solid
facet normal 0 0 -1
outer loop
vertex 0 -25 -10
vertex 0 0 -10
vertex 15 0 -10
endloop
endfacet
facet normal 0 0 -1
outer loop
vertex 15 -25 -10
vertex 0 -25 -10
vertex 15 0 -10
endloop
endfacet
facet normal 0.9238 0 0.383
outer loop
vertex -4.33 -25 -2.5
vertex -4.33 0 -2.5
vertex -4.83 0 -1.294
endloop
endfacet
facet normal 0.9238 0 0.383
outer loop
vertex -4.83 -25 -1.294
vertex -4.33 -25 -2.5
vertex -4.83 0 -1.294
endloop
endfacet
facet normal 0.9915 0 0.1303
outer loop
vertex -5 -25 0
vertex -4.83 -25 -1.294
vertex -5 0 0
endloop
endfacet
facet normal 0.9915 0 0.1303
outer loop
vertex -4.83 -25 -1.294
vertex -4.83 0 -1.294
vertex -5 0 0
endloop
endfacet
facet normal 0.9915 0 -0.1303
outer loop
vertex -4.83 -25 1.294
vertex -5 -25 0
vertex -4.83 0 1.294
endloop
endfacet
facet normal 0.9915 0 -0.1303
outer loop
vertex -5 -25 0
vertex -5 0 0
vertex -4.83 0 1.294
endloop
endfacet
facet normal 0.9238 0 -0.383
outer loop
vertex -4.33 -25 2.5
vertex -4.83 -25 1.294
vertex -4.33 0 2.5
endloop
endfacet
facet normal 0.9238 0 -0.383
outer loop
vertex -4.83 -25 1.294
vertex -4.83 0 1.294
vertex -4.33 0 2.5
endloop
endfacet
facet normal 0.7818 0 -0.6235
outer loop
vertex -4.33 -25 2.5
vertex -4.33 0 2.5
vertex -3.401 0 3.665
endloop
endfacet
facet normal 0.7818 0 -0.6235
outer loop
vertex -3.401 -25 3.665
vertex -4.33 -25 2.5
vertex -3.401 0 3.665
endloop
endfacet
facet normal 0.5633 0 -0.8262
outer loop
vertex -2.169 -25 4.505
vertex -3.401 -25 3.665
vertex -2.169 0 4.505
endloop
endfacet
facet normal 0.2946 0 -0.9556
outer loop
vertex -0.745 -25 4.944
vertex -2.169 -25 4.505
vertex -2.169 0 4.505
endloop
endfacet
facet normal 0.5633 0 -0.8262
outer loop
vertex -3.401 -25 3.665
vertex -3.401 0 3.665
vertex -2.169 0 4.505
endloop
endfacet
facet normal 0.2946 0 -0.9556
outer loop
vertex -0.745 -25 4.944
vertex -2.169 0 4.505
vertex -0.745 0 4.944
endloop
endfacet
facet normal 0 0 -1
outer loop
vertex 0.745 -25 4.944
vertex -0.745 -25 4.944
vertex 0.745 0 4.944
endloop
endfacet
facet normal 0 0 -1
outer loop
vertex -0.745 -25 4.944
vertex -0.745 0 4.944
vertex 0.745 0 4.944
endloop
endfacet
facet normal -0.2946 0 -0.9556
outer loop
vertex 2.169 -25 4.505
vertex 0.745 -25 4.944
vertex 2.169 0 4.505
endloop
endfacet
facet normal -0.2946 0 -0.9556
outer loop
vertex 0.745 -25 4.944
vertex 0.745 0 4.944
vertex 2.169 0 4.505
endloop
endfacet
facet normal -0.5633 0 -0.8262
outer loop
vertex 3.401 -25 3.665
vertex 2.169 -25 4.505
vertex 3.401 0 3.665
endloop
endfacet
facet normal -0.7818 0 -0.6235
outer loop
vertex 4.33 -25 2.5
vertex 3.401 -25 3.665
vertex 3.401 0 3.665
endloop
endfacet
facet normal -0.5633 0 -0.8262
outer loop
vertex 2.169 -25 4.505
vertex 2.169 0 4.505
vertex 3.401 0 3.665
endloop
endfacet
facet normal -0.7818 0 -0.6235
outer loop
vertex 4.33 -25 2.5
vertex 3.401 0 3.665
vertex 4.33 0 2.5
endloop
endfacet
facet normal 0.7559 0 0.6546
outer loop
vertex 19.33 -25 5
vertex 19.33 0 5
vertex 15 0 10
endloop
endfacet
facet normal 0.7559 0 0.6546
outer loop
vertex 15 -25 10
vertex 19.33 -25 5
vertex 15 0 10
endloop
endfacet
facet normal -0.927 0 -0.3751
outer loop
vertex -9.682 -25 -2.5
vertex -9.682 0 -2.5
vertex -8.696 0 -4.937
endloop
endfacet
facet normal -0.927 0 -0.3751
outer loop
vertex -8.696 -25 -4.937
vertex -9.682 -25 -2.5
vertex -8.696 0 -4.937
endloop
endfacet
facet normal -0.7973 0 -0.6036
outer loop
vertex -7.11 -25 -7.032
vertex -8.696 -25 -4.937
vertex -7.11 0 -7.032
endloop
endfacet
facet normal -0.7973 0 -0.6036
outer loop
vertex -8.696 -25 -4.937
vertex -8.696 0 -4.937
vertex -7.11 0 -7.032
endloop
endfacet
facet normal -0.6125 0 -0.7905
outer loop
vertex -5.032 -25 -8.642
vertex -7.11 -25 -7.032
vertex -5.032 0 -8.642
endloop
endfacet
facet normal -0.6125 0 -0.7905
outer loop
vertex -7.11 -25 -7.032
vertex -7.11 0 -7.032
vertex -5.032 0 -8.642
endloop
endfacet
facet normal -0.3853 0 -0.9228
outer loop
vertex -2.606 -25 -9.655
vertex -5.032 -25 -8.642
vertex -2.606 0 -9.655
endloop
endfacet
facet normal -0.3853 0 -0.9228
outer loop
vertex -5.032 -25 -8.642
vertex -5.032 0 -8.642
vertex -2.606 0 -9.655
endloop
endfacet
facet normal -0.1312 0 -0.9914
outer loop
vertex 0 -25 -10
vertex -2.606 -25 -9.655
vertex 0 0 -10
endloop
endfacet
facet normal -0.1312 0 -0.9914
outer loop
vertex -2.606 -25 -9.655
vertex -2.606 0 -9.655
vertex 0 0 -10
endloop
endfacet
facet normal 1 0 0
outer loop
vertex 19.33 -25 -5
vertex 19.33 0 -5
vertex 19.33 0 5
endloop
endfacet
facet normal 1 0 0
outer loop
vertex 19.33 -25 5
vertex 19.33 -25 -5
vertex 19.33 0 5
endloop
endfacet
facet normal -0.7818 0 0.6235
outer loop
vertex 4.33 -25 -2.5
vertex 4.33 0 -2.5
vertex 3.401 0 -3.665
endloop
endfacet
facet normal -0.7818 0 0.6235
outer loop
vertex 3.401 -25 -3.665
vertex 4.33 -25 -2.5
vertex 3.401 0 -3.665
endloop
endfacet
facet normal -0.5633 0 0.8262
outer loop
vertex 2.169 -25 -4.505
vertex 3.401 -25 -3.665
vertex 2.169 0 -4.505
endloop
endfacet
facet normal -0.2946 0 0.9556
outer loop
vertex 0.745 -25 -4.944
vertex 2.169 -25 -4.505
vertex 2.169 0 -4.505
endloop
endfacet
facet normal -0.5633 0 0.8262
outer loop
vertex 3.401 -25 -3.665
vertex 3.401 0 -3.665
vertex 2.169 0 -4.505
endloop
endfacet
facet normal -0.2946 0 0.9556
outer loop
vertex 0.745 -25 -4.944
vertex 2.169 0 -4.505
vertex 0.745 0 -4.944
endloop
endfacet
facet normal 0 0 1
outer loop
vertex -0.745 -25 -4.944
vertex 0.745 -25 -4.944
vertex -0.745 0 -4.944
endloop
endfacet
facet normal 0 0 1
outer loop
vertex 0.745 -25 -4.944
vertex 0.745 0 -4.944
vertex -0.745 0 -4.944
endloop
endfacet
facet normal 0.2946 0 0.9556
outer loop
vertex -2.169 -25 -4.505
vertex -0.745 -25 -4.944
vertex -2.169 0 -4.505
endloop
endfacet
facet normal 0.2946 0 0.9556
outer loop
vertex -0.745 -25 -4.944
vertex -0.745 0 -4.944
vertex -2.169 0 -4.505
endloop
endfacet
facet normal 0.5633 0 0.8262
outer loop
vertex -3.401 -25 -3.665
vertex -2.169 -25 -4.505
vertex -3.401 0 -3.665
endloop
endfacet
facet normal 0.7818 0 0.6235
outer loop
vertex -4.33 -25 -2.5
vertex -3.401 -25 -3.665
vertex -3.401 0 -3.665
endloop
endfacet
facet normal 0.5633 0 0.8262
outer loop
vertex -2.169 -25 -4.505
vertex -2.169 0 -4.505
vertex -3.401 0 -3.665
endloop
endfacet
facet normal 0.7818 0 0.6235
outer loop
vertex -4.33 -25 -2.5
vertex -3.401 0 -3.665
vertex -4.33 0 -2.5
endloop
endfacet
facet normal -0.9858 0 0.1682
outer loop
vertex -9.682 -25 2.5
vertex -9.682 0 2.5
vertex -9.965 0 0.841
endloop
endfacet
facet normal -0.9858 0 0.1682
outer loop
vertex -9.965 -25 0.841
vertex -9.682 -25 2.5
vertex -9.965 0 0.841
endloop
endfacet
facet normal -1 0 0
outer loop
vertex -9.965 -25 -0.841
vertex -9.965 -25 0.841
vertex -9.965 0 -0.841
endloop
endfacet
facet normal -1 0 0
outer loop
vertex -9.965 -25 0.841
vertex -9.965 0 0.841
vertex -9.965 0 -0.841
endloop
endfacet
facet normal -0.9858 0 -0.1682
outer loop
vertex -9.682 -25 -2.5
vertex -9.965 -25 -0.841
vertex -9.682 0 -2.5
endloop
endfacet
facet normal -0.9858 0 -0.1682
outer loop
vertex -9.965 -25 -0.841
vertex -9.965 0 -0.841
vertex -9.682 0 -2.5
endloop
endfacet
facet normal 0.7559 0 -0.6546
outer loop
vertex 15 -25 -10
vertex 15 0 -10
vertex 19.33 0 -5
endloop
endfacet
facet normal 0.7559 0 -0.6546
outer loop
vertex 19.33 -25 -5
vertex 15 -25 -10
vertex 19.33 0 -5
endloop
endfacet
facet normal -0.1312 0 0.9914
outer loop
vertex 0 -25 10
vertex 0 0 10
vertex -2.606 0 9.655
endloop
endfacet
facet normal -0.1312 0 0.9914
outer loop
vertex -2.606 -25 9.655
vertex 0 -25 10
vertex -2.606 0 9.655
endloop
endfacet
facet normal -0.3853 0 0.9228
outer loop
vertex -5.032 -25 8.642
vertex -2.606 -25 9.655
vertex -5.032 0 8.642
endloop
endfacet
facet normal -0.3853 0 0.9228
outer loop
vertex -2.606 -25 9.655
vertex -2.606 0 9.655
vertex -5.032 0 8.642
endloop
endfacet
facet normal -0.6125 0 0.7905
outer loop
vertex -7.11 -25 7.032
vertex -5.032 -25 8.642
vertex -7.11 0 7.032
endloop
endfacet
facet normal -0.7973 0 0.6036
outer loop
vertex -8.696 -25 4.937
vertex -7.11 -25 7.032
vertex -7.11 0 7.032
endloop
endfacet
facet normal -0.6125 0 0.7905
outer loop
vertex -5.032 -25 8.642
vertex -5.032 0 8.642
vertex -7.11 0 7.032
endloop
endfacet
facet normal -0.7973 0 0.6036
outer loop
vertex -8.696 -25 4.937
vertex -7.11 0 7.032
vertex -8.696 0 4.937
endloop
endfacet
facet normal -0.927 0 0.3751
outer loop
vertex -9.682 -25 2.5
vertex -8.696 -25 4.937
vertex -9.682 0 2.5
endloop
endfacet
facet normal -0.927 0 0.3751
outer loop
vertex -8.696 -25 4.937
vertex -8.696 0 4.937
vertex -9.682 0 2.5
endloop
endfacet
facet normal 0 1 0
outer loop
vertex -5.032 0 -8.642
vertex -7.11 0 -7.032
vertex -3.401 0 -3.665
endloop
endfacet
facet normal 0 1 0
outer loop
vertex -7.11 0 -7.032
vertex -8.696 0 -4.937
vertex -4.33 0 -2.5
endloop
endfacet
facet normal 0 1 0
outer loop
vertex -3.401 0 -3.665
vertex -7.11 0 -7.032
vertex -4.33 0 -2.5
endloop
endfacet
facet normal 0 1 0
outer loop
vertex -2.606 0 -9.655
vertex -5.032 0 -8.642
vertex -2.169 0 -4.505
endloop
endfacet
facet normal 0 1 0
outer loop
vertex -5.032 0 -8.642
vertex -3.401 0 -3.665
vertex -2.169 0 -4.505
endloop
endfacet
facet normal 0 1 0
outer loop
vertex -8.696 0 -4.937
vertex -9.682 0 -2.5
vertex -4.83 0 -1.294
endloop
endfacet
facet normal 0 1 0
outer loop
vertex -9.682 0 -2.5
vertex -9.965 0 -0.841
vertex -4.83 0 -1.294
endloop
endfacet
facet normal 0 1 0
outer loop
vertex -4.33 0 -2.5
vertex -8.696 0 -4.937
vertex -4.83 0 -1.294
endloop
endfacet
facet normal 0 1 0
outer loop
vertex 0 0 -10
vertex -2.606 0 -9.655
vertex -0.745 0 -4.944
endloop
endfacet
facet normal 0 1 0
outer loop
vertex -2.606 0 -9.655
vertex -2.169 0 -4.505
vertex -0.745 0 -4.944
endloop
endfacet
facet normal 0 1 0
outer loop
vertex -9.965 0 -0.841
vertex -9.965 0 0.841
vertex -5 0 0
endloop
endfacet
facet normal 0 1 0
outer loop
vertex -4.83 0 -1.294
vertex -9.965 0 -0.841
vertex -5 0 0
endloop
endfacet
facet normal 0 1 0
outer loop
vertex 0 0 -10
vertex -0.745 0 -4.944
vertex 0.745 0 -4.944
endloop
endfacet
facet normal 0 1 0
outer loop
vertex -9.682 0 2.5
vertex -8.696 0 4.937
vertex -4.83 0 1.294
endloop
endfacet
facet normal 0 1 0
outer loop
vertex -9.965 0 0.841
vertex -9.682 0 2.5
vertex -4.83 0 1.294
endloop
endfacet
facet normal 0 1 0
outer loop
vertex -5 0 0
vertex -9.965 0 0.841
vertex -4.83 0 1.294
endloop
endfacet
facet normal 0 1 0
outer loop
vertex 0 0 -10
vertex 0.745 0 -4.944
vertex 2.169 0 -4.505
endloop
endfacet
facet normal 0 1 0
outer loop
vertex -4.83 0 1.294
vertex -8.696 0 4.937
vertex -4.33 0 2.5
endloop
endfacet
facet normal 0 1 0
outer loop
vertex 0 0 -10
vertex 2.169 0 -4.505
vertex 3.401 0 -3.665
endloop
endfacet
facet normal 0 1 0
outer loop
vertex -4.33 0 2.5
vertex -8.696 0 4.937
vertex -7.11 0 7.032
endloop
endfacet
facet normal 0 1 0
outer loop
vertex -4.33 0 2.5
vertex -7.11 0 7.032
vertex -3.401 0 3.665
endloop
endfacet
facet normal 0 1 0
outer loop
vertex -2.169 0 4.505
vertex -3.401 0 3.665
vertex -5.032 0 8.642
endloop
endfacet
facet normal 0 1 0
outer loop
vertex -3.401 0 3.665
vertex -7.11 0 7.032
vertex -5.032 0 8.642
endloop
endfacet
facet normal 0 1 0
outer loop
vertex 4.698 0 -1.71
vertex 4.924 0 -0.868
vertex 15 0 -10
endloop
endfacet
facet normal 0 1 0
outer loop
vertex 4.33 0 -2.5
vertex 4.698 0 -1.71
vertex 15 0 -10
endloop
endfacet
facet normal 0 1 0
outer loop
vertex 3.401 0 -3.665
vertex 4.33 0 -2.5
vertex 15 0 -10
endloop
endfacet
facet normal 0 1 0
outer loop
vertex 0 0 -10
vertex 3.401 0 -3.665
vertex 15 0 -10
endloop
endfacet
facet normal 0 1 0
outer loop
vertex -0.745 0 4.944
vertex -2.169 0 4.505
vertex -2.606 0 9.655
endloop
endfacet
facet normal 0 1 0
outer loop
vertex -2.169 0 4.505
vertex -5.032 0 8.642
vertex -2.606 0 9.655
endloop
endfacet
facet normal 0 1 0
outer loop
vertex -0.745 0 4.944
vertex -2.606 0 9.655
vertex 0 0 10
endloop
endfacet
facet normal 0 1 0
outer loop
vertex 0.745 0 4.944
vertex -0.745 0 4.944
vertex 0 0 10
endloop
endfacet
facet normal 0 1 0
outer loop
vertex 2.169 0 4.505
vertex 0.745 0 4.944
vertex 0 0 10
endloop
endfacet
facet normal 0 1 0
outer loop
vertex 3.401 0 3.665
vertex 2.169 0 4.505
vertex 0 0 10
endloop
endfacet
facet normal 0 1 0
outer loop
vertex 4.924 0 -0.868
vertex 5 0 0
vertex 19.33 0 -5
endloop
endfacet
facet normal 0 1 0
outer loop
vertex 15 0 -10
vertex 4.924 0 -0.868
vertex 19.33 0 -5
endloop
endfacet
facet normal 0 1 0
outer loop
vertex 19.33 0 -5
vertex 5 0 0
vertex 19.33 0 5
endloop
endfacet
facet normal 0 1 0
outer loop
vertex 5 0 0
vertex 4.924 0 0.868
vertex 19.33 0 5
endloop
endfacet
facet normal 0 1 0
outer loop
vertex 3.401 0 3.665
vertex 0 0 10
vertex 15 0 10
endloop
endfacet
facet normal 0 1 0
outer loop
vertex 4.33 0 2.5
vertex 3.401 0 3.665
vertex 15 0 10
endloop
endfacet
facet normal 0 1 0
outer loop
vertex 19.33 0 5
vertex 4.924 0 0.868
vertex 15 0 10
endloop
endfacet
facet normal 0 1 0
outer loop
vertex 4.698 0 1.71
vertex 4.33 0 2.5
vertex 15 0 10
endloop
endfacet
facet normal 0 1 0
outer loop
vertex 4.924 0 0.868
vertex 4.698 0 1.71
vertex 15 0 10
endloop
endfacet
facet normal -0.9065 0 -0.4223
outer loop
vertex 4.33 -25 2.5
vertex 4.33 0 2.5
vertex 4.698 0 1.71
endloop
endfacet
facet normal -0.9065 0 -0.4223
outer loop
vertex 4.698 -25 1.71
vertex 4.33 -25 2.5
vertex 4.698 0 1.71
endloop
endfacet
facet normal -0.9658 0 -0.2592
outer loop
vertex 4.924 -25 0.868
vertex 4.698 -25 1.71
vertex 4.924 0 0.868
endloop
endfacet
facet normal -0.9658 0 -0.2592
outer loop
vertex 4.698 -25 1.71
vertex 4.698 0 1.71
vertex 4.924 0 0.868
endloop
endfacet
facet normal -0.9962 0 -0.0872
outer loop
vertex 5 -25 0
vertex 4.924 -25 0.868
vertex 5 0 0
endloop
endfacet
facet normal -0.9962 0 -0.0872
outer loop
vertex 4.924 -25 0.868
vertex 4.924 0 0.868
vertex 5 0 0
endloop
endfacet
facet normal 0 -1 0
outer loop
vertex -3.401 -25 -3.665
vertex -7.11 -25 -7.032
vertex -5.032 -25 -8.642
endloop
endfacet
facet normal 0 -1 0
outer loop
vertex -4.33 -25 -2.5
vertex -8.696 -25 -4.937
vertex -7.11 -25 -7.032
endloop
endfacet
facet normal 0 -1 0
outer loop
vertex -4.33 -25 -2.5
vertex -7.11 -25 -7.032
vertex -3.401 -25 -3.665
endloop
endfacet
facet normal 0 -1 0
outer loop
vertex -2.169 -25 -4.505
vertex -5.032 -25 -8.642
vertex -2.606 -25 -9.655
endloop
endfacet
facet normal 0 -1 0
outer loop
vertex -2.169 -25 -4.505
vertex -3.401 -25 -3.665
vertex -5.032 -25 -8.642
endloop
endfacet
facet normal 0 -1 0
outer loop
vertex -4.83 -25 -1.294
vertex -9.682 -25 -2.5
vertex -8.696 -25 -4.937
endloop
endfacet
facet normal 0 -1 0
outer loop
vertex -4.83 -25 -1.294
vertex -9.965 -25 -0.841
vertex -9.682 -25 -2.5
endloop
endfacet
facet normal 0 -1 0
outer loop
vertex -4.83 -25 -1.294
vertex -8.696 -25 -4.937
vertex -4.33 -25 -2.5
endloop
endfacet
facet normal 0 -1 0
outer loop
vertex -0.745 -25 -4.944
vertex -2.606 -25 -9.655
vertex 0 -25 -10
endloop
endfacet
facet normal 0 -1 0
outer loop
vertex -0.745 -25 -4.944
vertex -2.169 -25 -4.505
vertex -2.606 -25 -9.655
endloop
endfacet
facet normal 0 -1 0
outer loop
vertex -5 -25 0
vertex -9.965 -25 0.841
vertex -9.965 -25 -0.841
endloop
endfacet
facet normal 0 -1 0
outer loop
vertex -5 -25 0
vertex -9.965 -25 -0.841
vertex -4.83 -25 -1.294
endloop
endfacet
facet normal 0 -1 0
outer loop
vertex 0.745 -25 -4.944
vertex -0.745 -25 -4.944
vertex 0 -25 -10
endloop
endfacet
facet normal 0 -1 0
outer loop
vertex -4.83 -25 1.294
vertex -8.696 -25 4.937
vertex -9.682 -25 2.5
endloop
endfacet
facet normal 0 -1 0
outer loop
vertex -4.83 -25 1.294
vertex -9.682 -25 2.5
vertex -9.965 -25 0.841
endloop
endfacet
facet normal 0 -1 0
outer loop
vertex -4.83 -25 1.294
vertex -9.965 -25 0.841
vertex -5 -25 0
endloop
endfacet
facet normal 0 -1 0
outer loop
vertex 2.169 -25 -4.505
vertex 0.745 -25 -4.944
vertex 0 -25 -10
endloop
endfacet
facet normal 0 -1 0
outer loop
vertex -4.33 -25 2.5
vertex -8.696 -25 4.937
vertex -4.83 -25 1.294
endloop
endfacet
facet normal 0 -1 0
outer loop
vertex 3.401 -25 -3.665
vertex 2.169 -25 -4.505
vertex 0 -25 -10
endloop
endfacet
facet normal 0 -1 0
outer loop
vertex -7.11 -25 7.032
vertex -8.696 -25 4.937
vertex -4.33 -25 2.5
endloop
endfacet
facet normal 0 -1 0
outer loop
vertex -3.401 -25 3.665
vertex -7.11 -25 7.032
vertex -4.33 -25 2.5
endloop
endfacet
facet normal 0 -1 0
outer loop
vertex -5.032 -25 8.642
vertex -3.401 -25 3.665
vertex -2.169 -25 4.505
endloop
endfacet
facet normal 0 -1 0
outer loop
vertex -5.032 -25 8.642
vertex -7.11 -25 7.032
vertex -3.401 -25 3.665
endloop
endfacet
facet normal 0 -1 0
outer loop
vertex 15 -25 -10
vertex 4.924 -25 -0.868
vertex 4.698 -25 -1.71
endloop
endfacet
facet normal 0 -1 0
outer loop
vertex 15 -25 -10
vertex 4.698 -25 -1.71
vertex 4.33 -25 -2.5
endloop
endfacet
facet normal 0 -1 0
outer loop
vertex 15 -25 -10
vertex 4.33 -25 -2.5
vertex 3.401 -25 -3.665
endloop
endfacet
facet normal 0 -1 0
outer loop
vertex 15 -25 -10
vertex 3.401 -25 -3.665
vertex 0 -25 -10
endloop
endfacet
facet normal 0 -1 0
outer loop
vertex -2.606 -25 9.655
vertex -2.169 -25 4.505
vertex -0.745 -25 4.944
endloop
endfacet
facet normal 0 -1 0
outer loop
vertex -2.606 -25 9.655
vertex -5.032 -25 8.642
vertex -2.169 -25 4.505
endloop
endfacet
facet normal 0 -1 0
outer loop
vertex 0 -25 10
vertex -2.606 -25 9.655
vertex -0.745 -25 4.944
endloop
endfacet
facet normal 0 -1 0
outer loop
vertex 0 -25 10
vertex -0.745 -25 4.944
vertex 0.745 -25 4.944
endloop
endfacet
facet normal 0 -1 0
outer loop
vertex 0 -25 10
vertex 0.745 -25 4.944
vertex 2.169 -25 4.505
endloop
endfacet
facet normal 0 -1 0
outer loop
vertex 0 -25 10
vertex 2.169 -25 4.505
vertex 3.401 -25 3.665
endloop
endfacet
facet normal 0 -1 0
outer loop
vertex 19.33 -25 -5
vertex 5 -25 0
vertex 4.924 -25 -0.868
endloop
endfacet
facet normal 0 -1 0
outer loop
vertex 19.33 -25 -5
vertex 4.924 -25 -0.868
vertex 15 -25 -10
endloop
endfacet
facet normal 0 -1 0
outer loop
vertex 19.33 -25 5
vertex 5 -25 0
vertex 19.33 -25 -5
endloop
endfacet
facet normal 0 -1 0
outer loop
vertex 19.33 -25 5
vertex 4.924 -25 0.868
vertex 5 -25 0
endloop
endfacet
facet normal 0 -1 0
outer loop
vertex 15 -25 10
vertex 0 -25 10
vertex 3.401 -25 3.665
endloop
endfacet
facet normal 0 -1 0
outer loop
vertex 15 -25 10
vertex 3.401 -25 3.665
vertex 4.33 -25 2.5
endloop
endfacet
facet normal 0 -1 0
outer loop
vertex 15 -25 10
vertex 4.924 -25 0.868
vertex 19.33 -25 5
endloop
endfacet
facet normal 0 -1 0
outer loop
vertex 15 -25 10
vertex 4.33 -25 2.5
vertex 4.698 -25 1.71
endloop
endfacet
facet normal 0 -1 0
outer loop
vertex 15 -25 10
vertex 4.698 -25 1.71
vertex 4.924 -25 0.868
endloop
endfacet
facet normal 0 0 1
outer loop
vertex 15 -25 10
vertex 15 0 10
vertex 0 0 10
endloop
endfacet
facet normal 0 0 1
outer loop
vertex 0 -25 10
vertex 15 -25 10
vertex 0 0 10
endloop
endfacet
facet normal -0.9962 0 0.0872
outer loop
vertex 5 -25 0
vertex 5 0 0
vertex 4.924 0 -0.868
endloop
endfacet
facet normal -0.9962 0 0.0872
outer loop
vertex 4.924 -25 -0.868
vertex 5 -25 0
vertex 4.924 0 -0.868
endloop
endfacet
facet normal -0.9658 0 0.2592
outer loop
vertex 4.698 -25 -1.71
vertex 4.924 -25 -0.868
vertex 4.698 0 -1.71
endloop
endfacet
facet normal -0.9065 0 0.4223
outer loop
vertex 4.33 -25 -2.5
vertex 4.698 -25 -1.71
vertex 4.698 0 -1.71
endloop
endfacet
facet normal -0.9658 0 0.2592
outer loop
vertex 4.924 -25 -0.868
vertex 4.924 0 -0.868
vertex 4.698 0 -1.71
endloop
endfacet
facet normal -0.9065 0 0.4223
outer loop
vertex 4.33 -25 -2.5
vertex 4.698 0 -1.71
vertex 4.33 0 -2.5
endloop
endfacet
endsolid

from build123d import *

# Parameters (mm, degrees)
F1_DEPTH = 25


with BuildPart() as f1:
    # F0 (on Front) → F1 (new body)
    with BuildSketch(Plane.XZ):
        with BuildLine():
            ThreePointArc((-4.330127, 2.5), (0, 5), (4.330127, 2.5))
            Line((4.330127, 2.5), (9.682458, 2.5))
            ThreePointArc((9.682458, 2.5), (6.123724, 7.905694), (0, 10))
            ThreePointArc((0, 10), (-6.123724, 7.905694), (-9.682458, 2.5))
            Line((-9.682458, 2.5), (-4.330127, 2.5))
        make_face()
        with BuildLine():
            ThreePointArc((4.330127, 2.5), (4.829629, 1.294095), (5, 0))
            ThreePointArc((5, 0), (4.829629, -1.294095), (4.330127, -2.5))
            Line((4.330127, -2.5), (9.682458, -2.5))
            Line((9.682458, -2.5), (19.330127, -2.5))
            Line((19.330127, -2.5), (19.330127, 2.5))
            Line((19.330127, 2.5), (9.682458, 2.5))
            Line((9.682458, 2.5), (4.330127, 2.5))
        make_face()
        with BuildLine():
            Line((9.682458, -2.5), (4.330127, -2.5))
            ThreePointArc((4.330127, -2.5), (0, -5), (-4.330127, -2.5))
            Line((-4.330127, -2.5), (-9.682458, -2.5))
            ThreePointArc((-9.682458, -2.5), (-6.123724, -7.905694), (0, -10))
            ThreePointArc((0, -10), (6.123724, -7.905694), (9.682458, -2.5))
        make_face()
        with BuildLine():
            ThreePointArc((-4.330127, -2.5), (-5, 0), (-4.330127, 2.5))
            Line((-4.330127, 2.5), (-9.682458, 2.5))
            ThreePointArc((-9.682458, 2.5), (-10, 0), (-9.682458, -2.5))
            Line((-9.682458, -2.5), (-4.330127, -2.5))
        make_face()
        with BuildLine():
            ThreePointArc((0, 10), (6.123724, 7.905694), (9.682458, 2.5))
            Line((9.682458, 2.5), (19.330127, 2.5))
            Line((19.330127, 2.5), (19.330127, 5))
            Line((19.330127, 5), (15, 10))
            Line((15, 10), (0, 10))
        make_face()
        with BuildLine():
            Line((19.330127, -2.5), (9.682458, -2.5))
            ThreePointArc((9.682458, -2.5), (6.123724, -7.905694), (0, -10))
            Line((0, -10), (15, -10))
            Line((15, -10), (19.330127, -5))
            Line((19.330127, -5), (19.330127, -2.5))
        make_face()
    extrude(amount=F1_DEPTH)


solid = f1.part
